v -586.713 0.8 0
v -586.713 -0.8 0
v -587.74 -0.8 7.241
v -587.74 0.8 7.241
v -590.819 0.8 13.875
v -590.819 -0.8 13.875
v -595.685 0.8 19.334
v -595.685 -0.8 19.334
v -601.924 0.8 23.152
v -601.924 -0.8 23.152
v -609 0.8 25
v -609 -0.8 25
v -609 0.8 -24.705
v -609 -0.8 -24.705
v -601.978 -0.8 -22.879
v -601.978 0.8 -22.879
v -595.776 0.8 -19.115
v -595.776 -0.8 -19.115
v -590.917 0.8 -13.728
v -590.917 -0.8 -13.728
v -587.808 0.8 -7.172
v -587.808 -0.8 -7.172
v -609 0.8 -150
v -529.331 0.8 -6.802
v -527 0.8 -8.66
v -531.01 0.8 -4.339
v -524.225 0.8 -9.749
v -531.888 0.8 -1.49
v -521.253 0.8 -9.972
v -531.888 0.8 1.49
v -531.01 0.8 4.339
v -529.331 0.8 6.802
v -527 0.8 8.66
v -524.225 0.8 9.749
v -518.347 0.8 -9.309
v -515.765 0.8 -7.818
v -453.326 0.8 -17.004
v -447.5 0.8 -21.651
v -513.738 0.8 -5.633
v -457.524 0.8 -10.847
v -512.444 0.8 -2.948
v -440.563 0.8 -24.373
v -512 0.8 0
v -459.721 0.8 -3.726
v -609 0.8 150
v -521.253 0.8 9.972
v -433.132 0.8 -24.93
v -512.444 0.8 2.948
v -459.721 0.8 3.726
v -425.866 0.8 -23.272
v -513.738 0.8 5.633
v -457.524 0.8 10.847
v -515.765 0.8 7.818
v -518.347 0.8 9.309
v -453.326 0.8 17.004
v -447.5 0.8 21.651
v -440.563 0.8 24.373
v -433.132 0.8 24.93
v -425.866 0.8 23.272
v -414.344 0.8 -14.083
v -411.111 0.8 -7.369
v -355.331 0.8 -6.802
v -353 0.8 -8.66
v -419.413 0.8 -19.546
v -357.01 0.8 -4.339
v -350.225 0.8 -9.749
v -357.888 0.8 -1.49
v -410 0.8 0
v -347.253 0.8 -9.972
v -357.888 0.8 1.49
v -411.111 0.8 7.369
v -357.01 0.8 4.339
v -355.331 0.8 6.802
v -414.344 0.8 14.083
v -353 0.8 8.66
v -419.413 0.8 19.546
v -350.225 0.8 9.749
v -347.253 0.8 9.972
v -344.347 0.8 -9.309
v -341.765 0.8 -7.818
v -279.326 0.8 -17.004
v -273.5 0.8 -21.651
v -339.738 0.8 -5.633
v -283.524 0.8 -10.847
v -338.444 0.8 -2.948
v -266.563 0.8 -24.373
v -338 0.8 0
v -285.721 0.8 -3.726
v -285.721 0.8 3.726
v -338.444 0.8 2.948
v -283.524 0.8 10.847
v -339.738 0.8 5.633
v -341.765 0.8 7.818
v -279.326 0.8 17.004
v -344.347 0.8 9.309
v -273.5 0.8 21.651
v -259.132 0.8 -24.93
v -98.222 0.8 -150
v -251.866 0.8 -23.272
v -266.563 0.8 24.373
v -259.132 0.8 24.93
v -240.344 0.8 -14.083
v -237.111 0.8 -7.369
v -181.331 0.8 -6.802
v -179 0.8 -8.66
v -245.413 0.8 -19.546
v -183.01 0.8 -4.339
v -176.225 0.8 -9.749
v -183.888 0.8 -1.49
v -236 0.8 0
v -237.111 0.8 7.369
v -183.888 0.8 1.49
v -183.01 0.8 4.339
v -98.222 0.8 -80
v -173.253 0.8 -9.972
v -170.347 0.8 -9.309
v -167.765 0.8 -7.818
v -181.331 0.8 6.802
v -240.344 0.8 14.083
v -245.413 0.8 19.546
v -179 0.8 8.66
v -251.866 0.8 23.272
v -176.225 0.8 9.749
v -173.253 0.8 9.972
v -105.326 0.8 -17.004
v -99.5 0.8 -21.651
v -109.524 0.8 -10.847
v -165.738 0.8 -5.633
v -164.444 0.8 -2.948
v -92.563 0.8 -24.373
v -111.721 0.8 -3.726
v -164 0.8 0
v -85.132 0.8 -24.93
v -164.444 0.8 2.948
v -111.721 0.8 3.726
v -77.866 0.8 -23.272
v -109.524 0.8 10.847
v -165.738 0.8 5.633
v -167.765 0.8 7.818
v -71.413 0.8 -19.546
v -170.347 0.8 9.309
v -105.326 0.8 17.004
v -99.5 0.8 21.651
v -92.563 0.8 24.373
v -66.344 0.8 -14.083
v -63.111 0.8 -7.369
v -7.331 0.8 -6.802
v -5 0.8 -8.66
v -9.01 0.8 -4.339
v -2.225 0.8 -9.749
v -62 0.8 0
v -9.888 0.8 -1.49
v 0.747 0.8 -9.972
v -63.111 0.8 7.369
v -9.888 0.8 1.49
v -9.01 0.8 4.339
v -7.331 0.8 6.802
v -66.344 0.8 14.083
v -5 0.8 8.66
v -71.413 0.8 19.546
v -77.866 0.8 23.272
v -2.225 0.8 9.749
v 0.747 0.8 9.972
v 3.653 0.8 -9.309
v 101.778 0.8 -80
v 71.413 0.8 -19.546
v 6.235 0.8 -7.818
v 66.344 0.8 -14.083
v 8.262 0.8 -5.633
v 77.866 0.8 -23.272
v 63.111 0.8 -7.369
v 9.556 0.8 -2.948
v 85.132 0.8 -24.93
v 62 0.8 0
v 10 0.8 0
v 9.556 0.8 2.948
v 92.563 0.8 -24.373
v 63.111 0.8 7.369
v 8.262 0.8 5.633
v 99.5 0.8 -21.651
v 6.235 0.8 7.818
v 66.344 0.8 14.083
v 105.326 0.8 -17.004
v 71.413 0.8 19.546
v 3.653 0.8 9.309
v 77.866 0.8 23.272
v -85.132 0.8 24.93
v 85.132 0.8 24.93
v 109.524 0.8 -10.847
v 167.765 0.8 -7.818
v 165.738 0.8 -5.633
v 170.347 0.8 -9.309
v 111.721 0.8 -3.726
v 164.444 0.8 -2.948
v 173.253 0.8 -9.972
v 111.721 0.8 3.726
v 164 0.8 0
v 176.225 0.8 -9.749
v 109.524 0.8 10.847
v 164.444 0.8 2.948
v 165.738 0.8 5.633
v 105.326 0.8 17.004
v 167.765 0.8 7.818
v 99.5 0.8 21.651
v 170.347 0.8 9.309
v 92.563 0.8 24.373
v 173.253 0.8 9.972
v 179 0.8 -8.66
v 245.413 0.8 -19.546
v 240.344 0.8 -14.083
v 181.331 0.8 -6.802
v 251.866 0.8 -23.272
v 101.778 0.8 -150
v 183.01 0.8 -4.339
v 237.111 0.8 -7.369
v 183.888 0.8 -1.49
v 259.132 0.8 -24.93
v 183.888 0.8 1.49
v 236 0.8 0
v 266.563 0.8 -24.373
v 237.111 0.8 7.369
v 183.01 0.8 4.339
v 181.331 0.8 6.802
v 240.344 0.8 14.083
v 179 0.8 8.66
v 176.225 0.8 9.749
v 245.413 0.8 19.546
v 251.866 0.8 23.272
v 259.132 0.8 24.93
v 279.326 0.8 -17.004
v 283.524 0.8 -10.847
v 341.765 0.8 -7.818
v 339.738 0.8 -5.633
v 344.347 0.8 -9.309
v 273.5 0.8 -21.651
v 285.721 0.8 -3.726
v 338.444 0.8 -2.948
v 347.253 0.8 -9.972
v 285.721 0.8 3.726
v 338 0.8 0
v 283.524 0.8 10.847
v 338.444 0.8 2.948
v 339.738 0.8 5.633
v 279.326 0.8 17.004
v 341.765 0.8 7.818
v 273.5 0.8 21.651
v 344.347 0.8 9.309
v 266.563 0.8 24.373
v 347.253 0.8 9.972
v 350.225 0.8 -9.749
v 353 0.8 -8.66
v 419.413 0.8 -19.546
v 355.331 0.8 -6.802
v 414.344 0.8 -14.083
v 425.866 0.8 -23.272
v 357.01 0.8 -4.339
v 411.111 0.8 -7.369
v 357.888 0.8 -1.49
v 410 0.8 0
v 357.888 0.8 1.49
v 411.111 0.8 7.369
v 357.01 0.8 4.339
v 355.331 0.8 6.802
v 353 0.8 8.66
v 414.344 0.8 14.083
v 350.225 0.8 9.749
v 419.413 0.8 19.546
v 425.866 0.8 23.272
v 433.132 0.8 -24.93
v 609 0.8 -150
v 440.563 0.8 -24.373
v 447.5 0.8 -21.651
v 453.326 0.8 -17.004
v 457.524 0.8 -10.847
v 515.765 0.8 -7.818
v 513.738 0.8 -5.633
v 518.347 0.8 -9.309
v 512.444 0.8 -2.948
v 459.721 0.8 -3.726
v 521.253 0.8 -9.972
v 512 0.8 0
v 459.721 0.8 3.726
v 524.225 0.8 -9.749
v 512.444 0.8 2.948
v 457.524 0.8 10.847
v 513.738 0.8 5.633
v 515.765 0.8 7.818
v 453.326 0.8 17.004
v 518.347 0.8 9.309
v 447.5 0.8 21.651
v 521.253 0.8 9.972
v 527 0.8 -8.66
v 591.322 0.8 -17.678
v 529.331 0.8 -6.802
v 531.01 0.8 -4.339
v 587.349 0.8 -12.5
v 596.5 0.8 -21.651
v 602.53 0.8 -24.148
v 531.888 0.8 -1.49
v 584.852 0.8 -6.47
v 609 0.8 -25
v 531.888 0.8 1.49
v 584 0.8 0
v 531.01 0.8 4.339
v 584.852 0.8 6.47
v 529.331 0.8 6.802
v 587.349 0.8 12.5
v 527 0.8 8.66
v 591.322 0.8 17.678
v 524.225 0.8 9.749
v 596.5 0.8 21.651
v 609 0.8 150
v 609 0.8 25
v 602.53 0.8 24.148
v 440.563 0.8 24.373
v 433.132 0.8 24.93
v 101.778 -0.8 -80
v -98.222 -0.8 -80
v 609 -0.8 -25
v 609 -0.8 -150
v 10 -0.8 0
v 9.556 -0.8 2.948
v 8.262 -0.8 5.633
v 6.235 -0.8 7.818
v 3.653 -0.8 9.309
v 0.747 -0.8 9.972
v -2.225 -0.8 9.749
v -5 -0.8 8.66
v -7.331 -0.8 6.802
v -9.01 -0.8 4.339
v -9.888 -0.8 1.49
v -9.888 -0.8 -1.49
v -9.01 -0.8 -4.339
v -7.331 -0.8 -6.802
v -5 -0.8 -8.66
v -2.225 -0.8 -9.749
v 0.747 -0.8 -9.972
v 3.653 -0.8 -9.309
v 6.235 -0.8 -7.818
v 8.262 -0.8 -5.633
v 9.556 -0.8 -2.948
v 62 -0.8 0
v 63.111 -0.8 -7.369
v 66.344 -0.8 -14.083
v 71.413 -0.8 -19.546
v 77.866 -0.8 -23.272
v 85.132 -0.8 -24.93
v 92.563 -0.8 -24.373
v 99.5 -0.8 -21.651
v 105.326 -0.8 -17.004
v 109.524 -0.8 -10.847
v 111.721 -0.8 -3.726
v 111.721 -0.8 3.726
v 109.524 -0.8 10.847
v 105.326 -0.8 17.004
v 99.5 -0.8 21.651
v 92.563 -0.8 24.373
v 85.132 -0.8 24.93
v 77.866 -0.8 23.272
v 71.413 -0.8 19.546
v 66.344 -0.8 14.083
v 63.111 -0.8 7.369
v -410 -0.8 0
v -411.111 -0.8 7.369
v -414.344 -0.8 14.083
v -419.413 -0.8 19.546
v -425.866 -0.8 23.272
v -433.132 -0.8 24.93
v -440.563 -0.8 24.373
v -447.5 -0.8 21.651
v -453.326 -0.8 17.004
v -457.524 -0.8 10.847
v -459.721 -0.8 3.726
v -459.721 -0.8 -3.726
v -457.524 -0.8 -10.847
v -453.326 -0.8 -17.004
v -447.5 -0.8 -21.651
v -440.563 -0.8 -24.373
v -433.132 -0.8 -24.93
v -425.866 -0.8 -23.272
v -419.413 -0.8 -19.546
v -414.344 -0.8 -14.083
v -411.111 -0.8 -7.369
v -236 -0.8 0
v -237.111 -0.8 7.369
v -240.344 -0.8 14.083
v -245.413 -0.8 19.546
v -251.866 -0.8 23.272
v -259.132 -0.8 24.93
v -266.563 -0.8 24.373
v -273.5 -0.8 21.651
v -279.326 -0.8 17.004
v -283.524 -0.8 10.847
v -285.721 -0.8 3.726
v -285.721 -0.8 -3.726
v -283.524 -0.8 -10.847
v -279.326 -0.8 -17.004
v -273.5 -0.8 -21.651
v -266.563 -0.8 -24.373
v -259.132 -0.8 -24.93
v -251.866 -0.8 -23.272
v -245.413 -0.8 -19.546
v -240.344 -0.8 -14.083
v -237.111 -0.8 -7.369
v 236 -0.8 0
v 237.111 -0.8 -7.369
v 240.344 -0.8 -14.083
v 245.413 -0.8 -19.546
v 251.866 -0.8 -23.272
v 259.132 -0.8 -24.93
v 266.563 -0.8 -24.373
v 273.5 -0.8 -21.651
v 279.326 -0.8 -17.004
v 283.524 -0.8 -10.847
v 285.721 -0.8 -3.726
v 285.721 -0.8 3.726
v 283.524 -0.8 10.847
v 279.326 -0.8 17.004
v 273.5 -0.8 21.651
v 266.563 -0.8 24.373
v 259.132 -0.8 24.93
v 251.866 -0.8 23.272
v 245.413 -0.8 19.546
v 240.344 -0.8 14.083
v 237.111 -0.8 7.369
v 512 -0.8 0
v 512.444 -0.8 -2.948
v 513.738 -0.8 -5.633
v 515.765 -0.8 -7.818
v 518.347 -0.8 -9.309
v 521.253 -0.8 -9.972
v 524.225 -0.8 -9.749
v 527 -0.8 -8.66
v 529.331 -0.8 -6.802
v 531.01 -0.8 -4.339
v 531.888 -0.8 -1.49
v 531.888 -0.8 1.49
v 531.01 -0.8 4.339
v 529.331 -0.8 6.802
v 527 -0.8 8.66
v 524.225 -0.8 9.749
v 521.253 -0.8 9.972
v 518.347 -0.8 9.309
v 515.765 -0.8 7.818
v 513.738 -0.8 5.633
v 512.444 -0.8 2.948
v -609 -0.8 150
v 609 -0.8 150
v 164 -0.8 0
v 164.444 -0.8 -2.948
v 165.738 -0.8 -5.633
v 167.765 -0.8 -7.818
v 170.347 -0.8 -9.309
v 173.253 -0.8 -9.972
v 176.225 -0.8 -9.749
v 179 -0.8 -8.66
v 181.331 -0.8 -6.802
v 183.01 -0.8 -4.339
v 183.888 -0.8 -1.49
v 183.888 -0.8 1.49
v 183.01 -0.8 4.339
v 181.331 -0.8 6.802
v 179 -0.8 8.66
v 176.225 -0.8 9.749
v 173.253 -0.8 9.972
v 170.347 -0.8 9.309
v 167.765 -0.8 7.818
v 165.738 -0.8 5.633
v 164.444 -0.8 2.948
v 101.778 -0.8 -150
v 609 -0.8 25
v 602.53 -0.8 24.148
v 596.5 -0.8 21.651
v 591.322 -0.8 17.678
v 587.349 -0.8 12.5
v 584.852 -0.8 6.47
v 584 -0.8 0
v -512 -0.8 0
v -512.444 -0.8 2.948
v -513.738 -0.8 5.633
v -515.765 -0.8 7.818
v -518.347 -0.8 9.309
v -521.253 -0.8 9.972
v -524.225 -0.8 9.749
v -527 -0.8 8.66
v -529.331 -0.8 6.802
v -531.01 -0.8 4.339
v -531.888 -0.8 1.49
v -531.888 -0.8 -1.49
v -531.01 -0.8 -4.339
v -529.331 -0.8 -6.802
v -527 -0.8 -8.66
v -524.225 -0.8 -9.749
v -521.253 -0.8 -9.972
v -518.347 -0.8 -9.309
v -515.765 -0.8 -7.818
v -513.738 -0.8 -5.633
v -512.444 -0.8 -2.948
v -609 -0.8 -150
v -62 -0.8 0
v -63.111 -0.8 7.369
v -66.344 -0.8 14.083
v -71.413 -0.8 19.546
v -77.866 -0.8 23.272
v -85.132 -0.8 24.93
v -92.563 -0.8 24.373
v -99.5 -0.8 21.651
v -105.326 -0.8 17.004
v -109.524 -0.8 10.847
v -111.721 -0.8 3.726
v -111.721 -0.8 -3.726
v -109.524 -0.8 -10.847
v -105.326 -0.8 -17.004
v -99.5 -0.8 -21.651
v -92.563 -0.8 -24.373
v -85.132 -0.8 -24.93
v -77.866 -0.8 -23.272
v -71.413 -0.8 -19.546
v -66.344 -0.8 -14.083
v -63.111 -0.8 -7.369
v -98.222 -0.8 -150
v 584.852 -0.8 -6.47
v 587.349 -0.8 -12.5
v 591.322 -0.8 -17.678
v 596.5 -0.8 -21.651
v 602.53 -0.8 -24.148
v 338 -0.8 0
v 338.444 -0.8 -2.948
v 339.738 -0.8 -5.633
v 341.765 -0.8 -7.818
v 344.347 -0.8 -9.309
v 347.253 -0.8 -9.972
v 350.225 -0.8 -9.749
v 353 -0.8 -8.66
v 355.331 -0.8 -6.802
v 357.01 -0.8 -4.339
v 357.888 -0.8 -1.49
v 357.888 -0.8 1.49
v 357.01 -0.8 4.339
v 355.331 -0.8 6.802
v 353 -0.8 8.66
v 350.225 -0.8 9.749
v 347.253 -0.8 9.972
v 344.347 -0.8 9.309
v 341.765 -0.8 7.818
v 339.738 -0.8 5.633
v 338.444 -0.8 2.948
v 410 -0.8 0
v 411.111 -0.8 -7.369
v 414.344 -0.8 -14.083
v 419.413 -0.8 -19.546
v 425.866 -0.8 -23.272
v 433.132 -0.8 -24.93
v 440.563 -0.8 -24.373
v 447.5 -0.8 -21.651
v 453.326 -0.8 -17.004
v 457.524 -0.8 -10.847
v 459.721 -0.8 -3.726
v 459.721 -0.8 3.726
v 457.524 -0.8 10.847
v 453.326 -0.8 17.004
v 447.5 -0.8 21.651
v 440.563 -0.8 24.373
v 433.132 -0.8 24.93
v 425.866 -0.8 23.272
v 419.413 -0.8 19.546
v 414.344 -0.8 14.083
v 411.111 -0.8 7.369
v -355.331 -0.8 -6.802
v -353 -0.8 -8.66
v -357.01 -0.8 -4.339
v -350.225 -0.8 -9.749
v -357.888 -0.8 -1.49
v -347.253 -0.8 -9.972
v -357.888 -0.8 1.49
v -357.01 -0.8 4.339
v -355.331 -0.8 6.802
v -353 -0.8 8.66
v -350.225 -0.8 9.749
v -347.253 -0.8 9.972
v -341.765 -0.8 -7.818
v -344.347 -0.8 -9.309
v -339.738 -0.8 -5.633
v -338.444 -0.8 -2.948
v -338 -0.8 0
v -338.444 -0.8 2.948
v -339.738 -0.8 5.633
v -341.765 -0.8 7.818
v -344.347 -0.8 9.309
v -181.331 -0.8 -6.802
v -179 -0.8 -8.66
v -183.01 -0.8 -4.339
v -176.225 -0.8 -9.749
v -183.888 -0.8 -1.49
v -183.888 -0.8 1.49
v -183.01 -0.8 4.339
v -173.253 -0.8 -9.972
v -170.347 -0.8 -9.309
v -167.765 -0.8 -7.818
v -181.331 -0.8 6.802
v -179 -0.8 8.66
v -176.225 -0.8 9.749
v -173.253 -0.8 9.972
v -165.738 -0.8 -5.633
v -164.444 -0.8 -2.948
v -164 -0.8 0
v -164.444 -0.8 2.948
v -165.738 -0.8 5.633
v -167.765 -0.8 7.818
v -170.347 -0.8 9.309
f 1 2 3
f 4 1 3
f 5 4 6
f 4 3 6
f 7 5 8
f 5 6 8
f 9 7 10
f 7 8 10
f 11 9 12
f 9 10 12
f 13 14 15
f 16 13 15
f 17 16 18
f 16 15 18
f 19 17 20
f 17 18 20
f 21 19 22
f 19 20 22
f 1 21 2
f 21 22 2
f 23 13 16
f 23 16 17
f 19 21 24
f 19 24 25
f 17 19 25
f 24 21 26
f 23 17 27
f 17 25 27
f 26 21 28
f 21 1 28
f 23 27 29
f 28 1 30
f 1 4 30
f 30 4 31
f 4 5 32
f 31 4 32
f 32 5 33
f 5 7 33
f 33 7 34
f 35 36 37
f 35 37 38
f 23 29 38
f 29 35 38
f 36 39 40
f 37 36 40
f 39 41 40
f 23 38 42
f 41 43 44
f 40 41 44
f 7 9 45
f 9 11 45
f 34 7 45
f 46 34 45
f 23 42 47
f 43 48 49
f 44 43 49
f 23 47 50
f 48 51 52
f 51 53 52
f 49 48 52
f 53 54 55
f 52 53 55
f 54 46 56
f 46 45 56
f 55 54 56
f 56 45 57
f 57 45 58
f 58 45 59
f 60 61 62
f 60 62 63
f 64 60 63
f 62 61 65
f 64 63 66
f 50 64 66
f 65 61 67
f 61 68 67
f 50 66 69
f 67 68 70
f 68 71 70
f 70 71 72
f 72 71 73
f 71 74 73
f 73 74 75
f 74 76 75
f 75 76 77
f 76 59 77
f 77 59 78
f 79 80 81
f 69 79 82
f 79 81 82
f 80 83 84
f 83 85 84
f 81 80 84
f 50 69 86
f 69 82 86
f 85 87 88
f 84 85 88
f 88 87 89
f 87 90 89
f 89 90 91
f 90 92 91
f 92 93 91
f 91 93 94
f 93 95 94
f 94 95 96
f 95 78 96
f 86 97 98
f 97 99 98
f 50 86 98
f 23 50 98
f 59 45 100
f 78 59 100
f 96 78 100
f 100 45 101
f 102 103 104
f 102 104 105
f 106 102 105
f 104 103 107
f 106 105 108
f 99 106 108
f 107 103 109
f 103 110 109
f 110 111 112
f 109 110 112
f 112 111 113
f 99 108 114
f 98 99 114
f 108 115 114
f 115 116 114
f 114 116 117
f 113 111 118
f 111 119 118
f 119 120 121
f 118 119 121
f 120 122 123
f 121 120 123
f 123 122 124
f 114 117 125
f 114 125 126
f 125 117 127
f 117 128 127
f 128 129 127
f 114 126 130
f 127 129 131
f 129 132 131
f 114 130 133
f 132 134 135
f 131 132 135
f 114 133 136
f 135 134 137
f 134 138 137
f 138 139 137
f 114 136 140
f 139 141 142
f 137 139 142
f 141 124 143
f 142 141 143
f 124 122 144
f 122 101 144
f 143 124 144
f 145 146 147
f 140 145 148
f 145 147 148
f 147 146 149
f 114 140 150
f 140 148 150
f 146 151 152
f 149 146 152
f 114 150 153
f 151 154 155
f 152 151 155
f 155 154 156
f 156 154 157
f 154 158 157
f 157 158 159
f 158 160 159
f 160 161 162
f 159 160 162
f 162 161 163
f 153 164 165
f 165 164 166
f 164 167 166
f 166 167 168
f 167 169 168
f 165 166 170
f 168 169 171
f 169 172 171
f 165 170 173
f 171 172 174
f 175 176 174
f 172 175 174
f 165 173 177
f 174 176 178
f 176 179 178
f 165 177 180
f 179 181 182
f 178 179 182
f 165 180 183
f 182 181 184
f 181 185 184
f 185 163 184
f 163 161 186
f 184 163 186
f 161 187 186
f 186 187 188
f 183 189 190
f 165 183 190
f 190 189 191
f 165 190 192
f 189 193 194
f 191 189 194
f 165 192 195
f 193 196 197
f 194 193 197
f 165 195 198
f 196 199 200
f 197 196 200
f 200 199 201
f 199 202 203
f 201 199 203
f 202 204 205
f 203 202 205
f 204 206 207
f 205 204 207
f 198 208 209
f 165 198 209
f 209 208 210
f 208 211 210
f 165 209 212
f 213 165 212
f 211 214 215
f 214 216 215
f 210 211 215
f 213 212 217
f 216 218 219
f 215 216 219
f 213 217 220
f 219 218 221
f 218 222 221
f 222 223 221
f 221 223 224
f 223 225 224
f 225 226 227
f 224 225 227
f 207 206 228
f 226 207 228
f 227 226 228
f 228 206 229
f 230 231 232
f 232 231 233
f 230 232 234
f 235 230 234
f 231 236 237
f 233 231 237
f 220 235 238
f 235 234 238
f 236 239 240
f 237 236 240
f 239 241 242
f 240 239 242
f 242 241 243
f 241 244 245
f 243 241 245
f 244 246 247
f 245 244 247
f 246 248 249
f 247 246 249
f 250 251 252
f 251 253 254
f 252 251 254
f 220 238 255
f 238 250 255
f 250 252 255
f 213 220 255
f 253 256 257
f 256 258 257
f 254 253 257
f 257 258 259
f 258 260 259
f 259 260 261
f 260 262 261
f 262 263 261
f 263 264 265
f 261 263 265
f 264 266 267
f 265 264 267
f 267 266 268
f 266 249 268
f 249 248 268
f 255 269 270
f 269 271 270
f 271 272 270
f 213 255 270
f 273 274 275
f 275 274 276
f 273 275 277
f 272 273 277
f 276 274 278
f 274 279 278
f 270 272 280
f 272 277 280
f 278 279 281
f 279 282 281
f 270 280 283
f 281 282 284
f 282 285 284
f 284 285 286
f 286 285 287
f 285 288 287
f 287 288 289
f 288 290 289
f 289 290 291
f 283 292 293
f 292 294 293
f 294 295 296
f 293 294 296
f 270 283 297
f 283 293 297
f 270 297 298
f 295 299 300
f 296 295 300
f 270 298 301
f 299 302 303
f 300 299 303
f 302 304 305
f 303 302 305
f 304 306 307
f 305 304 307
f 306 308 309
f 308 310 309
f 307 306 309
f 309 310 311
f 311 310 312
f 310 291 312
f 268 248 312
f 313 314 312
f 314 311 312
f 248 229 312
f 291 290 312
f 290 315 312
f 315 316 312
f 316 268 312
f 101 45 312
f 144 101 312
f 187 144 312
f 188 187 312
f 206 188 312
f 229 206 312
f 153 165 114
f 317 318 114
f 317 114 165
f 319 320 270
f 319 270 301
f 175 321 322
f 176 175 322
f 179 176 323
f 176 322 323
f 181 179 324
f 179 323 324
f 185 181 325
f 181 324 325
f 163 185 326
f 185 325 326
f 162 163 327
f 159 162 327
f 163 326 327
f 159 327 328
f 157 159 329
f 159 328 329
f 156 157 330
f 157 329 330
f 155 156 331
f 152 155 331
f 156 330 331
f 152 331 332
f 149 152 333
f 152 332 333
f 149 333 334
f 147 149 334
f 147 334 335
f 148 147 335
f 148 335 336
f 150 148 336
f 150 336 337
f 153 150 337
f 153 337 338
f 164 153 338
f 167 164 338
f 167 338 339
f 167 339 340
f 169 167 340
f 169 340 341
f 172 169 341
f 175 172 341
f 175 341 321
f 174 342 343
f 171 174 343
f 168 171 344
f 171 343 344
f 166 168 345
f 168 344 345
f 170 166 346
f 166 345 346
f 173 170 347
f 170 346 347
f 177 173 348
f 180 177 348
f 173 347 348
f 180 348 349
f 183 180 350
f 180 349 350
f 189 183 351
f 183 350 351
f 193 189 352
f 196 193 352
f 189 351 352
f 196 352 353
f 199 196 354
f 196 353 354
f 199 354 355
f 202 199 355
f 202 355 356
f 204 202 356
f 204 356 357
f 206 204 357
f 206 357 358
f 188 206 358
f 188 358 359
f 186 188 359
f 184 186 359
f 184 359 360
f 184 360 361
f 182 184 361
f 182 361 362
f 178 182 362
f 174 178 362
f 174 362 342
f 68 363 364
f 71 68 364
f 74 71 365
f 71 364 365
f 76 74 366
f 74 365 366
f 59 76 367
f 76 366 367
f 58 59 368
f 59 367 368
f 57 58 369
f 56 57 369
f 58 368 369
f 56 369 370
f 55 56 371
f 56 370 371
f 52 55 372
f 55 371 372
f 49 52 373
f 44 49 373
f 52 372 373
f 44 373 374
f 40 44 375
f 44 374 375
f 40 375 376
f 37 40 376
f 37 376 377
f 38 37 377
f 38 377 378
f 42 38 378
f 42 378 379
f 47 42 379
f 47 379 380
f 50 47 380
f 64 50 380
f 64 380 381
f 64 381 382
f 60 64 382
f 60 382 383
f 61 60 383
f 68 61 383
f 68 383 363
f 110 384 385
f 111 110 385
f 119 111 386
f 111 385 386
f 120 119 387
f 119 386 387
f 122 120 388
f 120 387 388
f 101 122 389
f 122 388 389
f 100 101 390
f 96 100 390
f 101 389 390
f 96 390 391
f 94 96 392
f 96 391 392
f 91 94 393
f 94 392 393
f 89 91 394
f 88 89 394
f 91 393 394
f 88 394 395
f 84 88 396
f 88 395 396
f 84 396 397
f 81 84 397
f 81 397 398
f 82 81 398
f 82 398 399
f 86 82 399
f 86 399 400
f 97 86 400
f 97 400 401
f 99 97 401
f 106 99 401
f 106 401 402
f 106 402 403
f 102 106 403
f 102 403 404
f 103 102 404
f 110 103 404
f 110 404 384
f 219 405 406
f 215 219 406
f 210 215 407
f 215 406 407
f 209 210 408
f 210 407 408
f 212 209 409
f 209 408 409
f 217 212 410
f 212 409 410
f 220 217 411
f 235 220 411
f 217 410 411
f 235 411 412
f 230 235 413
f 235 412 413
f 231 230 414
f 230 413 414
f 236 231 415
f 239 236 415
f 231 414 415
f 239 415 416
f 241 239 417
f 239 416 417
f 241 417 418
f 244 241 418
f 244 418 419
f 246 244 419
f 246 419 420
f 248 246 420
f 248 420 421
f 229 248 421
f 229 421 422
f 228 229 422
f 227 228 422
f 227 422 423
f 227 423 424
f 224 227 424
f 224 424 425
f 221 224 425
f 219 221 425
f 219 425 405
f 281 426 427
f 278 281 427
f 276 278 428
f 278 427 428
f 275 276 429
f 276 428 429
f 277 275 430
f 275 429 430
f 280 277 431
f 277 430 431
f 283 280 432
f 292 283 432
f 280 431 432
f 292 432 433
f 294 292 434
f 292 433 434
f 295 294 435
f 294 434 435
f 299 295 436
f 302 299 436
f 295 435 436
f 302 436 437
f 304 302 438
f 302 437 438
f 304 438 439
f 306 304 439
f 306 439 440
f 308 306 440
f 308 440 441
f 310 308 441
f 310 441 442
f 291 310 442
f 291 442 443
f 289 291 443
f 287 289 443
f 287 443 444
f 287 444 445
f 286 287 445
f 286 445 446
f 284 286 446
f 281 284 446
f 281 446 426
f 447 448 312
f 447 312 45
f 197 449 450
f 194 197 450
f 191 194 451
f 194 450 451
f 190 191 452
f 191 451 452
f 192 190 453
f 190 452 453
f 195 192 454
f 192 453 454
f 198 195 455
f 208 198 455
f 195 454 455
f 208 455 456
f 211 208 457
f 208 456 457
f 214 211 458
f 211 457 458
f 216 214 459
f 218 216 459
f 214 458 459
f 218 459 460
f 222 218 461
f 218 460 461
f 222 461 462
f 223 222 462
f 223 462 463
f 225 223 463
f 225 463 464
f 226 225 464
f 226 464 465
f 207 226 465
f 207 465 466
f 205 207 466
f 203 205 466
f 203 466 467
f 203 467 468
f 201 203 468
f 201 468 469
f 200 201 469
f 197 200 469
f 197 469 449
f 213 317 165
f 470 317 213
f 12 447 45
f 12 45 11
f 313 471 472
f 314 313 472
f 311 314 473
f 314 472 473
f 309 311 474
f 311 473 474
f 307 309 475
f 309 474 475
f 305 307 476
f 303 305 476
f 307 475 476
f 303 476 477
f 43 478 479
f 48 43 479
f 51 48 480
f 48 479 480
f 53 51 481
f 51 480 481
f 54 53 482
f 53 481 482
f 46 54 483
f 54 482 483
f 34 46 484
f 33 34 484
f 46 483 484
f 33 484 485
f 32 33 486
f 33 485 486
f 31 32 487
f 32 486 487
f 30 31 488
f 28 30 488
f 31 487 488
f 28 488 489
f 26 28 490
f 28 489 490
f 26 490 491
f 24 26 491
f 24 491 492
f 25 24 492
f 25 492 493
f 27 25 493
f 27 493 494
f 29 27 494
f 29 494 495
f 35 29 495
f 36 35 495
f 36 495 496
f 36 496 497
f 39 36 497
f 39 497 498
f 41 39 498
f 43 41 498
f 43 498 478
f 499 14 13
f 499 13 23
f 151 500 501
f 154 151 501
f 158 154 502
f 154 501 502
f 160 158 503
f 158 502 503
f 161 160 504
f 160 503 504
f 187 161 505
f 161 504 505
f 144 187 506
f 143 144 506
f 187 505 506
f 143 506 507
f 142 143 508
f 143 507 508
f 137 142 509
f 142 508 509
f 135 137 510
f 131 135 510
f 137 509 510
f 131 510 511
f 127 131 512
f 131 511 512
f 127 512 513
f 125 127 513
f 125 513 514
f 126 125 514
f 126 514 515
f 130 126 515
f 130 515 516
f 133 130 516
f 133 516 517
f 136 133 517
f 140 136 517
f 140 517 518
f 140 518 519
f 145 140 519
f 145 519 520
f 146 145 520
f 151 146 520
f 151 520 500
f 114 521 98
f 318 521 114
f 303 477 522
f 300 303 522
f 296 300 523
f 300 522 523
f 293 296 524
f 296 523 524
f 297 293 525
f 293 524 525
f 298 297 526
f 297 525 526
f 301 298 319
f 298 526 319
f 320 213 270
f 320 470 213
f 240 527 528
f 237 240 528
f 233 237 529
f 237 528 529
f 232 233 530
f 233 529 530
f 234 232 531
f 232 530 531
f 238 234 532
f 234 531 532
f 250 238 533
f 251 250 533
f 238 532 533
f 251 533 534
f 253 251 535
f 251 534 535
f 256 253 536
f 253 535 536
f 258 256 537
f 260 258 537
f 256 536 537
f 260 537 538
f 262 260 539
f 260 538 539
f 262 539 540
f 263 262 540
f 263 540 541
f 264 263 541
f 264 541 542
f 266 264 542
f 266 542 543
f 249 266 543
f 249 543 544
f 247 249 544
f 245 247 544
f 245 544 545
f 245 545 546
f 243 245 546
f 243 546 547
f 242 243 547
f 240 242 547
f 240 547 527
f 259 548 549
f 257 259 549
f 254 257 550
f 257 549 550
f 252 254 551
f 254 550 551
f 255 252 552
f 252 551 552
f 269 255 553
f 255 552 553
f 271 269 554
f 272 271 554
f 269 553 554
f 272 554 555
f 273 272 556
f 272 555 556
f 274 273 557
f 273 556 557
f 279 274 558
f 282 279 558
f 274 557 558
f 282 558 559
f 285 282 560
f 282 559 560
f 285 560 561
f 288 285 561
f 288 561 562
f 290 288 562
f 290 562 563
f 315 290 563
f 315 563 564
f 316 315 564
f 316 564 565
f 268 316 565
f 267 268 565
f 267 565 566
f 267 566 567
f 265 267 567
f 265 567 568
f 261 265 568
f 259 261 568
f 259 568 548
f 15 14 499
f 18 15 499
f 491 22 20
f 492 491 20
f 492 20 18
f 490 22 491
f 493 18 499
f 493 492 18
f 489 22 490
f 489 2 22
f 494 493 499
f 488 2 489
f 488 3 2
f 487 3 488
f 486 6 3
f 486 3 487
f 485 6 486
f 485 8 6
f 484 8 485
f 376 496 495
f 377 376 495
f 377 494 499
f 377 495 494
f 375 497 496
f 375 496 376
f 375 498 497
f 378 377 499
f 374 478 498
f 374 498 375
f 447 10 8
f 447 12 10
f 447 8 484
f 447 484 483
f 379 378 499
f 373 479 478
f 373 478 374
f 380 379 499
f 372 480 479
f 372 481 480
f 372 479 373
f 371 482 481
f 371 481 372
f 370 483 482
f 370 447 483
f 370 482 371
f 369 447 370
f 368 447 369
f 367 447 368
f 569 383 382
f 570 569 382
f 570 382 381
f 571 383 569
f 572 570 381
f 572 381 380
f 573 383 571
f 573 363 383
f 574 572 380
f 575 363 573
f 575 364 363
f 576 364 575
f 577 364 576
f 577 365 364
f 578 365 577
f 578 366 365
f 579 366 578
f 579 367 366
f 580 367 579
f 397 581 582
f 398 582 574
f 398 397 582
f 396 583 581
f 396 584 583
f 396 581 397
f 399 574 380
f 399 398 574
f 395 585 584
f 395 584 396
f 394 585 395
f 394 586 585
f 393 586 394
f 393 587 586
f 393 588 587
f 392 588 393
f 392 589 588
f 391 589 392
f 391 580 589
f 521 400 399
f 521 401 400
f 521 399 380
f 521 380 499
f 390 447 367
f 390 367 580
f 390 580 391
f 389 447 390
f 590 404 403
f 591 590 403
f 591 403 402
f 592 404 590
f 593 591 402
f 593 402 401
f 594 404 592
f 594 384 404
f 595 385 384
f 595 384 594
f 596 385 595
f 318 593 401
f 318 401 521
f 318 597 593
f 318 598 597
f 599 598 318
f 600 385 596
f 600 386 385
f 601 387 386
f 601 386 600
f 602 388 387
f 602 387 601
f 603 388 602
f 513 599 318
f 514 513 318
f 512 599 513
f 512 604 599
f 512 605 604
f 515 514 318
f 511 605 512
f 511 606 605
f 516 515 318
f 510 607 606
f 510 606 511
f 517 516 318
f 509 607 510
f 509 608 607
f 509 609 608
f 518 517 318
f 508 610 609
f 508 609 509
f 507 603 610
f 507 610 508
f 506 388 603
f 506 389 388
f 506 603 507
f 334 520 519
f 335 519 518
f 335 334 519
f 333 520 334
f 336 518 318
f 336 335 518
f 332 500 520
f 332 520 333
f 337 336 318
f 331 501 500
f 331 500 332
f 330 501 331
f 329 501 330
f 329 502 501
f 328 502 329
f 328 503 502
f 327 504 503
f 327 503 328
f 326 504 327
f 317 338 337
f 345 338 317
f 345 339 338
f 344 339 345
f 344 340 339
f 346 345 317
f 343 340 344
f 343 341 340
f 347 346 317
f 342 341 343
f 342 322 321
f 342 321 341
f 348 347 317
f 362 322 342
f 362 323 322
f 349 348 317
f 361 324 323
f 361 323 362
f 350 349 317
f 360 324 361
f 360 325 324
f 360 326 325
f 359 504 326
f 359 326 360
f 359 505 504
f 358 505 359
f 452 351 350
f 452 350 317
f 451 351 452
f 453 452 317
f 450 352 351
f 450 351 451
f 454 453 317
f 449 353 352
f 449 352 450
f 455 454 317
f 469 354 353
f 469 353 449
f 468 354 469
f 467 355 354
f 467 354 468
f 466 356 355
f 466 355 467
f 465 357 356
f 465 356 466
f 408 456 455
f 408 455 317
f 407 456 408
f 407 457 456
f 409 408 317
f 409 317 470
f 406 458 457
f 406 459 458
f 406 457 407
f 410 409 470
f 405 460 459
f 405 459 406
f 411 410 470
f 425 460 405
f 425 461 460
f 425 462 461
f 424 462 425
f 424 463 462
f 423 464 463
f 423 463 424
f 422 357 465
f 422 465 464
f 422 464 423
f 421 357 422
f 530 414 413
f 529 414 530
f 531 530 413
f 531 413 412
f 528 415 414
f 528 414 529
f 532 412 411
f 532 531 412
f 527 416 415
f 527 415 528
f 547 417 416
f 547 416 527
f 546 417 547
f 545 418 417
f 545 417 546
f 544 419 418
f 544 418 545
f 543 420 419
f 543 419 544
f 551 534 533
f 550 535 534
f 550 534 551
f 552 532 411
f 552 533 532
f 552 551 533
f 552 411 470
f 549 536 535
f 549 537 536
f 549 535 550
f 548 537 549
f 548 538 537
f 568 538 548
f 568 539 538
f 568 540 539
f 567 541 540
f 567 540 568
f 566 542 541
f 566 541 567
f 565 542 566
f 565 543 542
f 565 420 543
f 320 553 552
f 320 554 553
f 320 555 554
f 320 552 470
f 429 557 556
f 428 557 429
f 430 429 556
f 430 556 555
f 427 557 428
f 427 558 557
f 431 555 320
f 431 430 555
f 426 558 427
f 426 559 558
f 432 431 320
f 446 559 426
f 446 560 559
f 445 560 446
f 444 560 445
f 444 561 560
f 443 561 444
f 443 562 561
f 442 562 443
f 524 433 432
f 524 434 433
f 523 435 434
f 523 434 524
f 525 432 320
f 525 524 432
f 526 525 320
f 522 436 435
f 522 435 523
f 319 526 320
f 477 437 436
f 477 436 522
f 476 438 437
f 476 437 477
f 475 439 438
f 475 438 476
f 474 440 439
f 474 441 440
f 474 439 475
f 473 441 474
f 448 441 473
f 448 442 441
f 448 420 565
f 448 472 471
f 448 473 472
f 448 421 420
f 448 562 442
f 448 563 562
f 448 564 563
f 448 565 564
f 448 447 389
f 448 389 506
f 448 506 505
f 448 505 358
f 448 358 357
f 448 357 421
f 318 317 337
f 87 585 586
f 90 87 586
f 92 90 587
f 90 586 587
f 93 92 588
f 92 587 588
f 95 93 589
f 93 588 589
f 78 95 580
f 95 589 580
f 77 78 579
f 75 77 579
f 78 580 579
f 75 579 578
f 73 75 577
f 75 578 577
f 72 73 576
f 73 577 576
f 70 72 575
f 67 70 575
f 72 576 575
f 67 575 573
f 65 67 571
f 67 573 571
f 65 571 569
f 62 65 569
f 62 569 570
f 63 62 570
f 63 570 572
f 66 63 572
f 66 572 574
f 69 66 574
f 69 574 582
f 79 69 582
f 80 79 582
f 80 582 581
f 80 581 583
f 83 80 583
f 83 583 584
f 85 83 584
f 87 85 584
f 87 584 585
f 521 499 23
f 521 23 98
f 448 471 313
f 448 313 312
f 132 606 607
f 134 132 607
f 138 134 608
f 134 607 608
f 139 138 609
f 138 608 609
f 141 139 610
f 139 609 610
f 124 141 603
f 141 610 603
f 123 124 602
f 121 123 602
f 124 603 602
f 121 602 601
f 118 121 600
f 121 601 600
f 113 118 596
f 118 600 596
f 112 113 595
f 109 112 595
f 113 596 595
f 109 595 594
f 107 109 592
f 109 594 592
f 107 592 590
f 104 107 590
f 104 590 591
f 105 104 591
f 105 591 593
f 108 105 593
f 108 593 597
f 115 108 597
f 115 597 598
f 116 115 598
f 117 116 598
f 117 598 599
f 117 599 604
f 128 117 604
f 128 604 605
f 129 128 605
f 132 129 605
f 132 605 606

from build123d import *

# Parameters (mm, degrees)
F1_DEPTH = 0.8
F3_DEPTH = 25


# Not quite as in the source:
# - a feature names something its author has since deleted; it is built from what else it names


with BuildPart() as f1:
    # F0 (on Front) → F1 (new body, symmetric)
    with BuildSketch(Plane.XZ):
        Polygon((609, -150), (609, 150), (-609, 150), (-609, -150), (-98.2216194272, -150), (-98.2216194272, -80), (101.7783805728, -80), (101.7783805728, -150), align=None)
    extrude(amount=F1_DEPTH, both=True)

    # F2 (on face) → F3 (cut)
    with BuildSketch(Plane.XZ.offset(0.8)):
        with BuildLine():
            Line((-609, 0), (-586.7130714899, 0))
            ThreePointArc((-586.7130714899, 0), (-593.05140569, 16.7836636007), (-609, 25))
            Line((-609, 25), (-609, 0))
        make_face()
        with BuildLine():
            ThreePointArc((-460, 0), (-435, -25), (-410, 0))
            Line((-410, 0), (-435, 0))
            Line((-435, 0), (-460, 0))
        make_face()
        with BuildLine():
            Line((-435, 0), (-410, 0))
            ThreePointArc((-410, 0), (-435, 25), (-460, 0))
            Line((-460, 0), (-435, 0))
        make_face()
        with BuildLine():
            ThreePointArc((-286, 0), (-261, -25), (-236, 0))
            Line((-236, 0), (-261, 0))
            Line((-261, 0), (-286, 0))
        make_face()
        with BuildLine():
            Line((-261, 0), (-236, 0))
            ThreePointArc((-236, 0), (-261, 25), (-286, 0))
            Line((-286, 0), (-261, 0))
        make_face()
        with BuildLine():
            ThreePointArc((-112, 0), (-87, -25), (-62, 0))
            Line((-62, 0), (-87, 0))
            Line((-87, 0), (-112, 0))
        make_face()
        with BuildLine():
            Line((-87, 0), (-62, 0))
            ThreePointArc((-62, 0), (-87, 25), (-112, 0))
            Line((-112, 0), (-87, 0))
        make_face()
        with BuildLine():
            ThreePointArc((112, 0), (87, 25), (62, 0))
            Line((62, 0), (87, 0))
            Line((87, 0), (112, 0))
        make_face()
        with BuildLine():
            Line((87, 0), (62, 0))
            ThreePointArc((62, 0), (87, -25), (112, 0))
            Line((112, 0), (87, 0))
        make_face()
        with BuildLine():
            ThreePointArc((286, 0), (261, 25), (236, 0))
            Line((236, 0), (261, 0))
            Line((261, 0), (286, 0))
        make_face()
        with BuildLine():
            Line((261, 0), (236, 0))
            ThreePointArc((236, 0), (261, -25), (286, 0))
            Line((286, 0), (261, 0))
        make_face()
        with BuildLine():
            ThreePointArc((460, 0), (435, 25), (410, 0))
            Line((410, 0), (435, 0))
            Line((435, 0), (460, 0))
        make_face()
        with BuildLine():
            Line((435, 0), (410, 0))
            ThreePointArc((410, 0), (435, -25), (460, 0))
            Line((460, 0), (435, 0))
        make_face()
        with BuildLine():
            ThreePointArc((-609, -24.7047928188), (-593.1499526355, -16.5983450419), (-586.7130714899, 0))
            Line((-586.7130714899, 0), (-609, 0))
            Line((-609, 0), (-609, -24.7047928188))
        make_face()
        with BuildLine():
            ThreePointArc((609, 25), (591.3223304703, 17.6776695297), (584, 0))
            Line((584, 0), (609, 0))
            Line((609, 0), (609, 25))
        make_face()
        with BuildLine():
            Line((609, 0), (584, 0))
            ThreePointArc((584, 0), (591.3223304703, -17.6776695297), (609, -25))
            Line((609, -25), (609, 0))
        make_face()
        with BuildLine():
            ThreePointArc((-532, 0), (-522, -10), (-512, 0))
            Line((-512, 0), (-532, 0))
        make_face()
        with BuildLine():
            Line((-532, 0), (-512, 0))
            ThreePointArc((-512, 0), (-522, 10), (-532, 0))
        make_face()
        with BuildLine():
            ThreePointArc((-358, 0), (-348, -10), (-338, 0))
            Line((-338, 0), (-358, 0))
        make_face()
        with BuildLine():
            Line((-358, 0), (-338, 0))
            ThreePointArc((-338, 0), (-348, 10), (-358, 0))
        make_face()
        with BuildLine():
            ThreePointArc((-184, 0), (-174, -10), (-164, 0))
            Line((-164, 0), (-184, 0))
        make_face()
        with BuildLine():
            Line((-184, 0), (-164, 0))
            ThreePointArc((-164, 0), (-174, 10), (-184, 0))
        make_face()
        with BuildLine():
            Line((0, 0), (-10, 0))
            ThreePointArc((-10, 0), (0, -10), (10, 0))
            Line((10, 0), (0, 0))
        make_face()
        with BuildLine():
            ThreePointArc((10, 0), (0, 10), (-10, 0))
            Line((-10, 0), (0, 0))
            Line((0, 0), (10, 0))
        make_face()
        with BuildLine():
            ThreePointArc((184, 0), (174, 10), (164, 0))
            Line((164, 0), (184, 0))
        make_face()
        with BuildLine():
            Line((184, 0), (164, 0))
            ThreePointArc((164, 0), (174, -10), (184, 0))
        make_face()
        with BuildLine():
            ThreePointArc((358, 0), (348, 10), (338, 0))
            Line((338, 0), (358, 0))
        make_face()
        with BuildLine():
            Line((358, 0), (338, 0))
            ThreePointArc((338, 0), (348, -10), (358, 0))
        make_face()
        with BuildLine():
            ThreePointArc((532, 0), (522, 10), (512, 0))
            Line((512, 0), (532, 0))
        make_face()
        with BuildLine():
            Line((532, 0), (512, 0))
            ThreePointArc((512, 0), (522, -10), (532, 0))
        make_face()
    extrude(amount=-F3_DEPTH, mode=Mode.SUBTRACT)


solid = f1.part
